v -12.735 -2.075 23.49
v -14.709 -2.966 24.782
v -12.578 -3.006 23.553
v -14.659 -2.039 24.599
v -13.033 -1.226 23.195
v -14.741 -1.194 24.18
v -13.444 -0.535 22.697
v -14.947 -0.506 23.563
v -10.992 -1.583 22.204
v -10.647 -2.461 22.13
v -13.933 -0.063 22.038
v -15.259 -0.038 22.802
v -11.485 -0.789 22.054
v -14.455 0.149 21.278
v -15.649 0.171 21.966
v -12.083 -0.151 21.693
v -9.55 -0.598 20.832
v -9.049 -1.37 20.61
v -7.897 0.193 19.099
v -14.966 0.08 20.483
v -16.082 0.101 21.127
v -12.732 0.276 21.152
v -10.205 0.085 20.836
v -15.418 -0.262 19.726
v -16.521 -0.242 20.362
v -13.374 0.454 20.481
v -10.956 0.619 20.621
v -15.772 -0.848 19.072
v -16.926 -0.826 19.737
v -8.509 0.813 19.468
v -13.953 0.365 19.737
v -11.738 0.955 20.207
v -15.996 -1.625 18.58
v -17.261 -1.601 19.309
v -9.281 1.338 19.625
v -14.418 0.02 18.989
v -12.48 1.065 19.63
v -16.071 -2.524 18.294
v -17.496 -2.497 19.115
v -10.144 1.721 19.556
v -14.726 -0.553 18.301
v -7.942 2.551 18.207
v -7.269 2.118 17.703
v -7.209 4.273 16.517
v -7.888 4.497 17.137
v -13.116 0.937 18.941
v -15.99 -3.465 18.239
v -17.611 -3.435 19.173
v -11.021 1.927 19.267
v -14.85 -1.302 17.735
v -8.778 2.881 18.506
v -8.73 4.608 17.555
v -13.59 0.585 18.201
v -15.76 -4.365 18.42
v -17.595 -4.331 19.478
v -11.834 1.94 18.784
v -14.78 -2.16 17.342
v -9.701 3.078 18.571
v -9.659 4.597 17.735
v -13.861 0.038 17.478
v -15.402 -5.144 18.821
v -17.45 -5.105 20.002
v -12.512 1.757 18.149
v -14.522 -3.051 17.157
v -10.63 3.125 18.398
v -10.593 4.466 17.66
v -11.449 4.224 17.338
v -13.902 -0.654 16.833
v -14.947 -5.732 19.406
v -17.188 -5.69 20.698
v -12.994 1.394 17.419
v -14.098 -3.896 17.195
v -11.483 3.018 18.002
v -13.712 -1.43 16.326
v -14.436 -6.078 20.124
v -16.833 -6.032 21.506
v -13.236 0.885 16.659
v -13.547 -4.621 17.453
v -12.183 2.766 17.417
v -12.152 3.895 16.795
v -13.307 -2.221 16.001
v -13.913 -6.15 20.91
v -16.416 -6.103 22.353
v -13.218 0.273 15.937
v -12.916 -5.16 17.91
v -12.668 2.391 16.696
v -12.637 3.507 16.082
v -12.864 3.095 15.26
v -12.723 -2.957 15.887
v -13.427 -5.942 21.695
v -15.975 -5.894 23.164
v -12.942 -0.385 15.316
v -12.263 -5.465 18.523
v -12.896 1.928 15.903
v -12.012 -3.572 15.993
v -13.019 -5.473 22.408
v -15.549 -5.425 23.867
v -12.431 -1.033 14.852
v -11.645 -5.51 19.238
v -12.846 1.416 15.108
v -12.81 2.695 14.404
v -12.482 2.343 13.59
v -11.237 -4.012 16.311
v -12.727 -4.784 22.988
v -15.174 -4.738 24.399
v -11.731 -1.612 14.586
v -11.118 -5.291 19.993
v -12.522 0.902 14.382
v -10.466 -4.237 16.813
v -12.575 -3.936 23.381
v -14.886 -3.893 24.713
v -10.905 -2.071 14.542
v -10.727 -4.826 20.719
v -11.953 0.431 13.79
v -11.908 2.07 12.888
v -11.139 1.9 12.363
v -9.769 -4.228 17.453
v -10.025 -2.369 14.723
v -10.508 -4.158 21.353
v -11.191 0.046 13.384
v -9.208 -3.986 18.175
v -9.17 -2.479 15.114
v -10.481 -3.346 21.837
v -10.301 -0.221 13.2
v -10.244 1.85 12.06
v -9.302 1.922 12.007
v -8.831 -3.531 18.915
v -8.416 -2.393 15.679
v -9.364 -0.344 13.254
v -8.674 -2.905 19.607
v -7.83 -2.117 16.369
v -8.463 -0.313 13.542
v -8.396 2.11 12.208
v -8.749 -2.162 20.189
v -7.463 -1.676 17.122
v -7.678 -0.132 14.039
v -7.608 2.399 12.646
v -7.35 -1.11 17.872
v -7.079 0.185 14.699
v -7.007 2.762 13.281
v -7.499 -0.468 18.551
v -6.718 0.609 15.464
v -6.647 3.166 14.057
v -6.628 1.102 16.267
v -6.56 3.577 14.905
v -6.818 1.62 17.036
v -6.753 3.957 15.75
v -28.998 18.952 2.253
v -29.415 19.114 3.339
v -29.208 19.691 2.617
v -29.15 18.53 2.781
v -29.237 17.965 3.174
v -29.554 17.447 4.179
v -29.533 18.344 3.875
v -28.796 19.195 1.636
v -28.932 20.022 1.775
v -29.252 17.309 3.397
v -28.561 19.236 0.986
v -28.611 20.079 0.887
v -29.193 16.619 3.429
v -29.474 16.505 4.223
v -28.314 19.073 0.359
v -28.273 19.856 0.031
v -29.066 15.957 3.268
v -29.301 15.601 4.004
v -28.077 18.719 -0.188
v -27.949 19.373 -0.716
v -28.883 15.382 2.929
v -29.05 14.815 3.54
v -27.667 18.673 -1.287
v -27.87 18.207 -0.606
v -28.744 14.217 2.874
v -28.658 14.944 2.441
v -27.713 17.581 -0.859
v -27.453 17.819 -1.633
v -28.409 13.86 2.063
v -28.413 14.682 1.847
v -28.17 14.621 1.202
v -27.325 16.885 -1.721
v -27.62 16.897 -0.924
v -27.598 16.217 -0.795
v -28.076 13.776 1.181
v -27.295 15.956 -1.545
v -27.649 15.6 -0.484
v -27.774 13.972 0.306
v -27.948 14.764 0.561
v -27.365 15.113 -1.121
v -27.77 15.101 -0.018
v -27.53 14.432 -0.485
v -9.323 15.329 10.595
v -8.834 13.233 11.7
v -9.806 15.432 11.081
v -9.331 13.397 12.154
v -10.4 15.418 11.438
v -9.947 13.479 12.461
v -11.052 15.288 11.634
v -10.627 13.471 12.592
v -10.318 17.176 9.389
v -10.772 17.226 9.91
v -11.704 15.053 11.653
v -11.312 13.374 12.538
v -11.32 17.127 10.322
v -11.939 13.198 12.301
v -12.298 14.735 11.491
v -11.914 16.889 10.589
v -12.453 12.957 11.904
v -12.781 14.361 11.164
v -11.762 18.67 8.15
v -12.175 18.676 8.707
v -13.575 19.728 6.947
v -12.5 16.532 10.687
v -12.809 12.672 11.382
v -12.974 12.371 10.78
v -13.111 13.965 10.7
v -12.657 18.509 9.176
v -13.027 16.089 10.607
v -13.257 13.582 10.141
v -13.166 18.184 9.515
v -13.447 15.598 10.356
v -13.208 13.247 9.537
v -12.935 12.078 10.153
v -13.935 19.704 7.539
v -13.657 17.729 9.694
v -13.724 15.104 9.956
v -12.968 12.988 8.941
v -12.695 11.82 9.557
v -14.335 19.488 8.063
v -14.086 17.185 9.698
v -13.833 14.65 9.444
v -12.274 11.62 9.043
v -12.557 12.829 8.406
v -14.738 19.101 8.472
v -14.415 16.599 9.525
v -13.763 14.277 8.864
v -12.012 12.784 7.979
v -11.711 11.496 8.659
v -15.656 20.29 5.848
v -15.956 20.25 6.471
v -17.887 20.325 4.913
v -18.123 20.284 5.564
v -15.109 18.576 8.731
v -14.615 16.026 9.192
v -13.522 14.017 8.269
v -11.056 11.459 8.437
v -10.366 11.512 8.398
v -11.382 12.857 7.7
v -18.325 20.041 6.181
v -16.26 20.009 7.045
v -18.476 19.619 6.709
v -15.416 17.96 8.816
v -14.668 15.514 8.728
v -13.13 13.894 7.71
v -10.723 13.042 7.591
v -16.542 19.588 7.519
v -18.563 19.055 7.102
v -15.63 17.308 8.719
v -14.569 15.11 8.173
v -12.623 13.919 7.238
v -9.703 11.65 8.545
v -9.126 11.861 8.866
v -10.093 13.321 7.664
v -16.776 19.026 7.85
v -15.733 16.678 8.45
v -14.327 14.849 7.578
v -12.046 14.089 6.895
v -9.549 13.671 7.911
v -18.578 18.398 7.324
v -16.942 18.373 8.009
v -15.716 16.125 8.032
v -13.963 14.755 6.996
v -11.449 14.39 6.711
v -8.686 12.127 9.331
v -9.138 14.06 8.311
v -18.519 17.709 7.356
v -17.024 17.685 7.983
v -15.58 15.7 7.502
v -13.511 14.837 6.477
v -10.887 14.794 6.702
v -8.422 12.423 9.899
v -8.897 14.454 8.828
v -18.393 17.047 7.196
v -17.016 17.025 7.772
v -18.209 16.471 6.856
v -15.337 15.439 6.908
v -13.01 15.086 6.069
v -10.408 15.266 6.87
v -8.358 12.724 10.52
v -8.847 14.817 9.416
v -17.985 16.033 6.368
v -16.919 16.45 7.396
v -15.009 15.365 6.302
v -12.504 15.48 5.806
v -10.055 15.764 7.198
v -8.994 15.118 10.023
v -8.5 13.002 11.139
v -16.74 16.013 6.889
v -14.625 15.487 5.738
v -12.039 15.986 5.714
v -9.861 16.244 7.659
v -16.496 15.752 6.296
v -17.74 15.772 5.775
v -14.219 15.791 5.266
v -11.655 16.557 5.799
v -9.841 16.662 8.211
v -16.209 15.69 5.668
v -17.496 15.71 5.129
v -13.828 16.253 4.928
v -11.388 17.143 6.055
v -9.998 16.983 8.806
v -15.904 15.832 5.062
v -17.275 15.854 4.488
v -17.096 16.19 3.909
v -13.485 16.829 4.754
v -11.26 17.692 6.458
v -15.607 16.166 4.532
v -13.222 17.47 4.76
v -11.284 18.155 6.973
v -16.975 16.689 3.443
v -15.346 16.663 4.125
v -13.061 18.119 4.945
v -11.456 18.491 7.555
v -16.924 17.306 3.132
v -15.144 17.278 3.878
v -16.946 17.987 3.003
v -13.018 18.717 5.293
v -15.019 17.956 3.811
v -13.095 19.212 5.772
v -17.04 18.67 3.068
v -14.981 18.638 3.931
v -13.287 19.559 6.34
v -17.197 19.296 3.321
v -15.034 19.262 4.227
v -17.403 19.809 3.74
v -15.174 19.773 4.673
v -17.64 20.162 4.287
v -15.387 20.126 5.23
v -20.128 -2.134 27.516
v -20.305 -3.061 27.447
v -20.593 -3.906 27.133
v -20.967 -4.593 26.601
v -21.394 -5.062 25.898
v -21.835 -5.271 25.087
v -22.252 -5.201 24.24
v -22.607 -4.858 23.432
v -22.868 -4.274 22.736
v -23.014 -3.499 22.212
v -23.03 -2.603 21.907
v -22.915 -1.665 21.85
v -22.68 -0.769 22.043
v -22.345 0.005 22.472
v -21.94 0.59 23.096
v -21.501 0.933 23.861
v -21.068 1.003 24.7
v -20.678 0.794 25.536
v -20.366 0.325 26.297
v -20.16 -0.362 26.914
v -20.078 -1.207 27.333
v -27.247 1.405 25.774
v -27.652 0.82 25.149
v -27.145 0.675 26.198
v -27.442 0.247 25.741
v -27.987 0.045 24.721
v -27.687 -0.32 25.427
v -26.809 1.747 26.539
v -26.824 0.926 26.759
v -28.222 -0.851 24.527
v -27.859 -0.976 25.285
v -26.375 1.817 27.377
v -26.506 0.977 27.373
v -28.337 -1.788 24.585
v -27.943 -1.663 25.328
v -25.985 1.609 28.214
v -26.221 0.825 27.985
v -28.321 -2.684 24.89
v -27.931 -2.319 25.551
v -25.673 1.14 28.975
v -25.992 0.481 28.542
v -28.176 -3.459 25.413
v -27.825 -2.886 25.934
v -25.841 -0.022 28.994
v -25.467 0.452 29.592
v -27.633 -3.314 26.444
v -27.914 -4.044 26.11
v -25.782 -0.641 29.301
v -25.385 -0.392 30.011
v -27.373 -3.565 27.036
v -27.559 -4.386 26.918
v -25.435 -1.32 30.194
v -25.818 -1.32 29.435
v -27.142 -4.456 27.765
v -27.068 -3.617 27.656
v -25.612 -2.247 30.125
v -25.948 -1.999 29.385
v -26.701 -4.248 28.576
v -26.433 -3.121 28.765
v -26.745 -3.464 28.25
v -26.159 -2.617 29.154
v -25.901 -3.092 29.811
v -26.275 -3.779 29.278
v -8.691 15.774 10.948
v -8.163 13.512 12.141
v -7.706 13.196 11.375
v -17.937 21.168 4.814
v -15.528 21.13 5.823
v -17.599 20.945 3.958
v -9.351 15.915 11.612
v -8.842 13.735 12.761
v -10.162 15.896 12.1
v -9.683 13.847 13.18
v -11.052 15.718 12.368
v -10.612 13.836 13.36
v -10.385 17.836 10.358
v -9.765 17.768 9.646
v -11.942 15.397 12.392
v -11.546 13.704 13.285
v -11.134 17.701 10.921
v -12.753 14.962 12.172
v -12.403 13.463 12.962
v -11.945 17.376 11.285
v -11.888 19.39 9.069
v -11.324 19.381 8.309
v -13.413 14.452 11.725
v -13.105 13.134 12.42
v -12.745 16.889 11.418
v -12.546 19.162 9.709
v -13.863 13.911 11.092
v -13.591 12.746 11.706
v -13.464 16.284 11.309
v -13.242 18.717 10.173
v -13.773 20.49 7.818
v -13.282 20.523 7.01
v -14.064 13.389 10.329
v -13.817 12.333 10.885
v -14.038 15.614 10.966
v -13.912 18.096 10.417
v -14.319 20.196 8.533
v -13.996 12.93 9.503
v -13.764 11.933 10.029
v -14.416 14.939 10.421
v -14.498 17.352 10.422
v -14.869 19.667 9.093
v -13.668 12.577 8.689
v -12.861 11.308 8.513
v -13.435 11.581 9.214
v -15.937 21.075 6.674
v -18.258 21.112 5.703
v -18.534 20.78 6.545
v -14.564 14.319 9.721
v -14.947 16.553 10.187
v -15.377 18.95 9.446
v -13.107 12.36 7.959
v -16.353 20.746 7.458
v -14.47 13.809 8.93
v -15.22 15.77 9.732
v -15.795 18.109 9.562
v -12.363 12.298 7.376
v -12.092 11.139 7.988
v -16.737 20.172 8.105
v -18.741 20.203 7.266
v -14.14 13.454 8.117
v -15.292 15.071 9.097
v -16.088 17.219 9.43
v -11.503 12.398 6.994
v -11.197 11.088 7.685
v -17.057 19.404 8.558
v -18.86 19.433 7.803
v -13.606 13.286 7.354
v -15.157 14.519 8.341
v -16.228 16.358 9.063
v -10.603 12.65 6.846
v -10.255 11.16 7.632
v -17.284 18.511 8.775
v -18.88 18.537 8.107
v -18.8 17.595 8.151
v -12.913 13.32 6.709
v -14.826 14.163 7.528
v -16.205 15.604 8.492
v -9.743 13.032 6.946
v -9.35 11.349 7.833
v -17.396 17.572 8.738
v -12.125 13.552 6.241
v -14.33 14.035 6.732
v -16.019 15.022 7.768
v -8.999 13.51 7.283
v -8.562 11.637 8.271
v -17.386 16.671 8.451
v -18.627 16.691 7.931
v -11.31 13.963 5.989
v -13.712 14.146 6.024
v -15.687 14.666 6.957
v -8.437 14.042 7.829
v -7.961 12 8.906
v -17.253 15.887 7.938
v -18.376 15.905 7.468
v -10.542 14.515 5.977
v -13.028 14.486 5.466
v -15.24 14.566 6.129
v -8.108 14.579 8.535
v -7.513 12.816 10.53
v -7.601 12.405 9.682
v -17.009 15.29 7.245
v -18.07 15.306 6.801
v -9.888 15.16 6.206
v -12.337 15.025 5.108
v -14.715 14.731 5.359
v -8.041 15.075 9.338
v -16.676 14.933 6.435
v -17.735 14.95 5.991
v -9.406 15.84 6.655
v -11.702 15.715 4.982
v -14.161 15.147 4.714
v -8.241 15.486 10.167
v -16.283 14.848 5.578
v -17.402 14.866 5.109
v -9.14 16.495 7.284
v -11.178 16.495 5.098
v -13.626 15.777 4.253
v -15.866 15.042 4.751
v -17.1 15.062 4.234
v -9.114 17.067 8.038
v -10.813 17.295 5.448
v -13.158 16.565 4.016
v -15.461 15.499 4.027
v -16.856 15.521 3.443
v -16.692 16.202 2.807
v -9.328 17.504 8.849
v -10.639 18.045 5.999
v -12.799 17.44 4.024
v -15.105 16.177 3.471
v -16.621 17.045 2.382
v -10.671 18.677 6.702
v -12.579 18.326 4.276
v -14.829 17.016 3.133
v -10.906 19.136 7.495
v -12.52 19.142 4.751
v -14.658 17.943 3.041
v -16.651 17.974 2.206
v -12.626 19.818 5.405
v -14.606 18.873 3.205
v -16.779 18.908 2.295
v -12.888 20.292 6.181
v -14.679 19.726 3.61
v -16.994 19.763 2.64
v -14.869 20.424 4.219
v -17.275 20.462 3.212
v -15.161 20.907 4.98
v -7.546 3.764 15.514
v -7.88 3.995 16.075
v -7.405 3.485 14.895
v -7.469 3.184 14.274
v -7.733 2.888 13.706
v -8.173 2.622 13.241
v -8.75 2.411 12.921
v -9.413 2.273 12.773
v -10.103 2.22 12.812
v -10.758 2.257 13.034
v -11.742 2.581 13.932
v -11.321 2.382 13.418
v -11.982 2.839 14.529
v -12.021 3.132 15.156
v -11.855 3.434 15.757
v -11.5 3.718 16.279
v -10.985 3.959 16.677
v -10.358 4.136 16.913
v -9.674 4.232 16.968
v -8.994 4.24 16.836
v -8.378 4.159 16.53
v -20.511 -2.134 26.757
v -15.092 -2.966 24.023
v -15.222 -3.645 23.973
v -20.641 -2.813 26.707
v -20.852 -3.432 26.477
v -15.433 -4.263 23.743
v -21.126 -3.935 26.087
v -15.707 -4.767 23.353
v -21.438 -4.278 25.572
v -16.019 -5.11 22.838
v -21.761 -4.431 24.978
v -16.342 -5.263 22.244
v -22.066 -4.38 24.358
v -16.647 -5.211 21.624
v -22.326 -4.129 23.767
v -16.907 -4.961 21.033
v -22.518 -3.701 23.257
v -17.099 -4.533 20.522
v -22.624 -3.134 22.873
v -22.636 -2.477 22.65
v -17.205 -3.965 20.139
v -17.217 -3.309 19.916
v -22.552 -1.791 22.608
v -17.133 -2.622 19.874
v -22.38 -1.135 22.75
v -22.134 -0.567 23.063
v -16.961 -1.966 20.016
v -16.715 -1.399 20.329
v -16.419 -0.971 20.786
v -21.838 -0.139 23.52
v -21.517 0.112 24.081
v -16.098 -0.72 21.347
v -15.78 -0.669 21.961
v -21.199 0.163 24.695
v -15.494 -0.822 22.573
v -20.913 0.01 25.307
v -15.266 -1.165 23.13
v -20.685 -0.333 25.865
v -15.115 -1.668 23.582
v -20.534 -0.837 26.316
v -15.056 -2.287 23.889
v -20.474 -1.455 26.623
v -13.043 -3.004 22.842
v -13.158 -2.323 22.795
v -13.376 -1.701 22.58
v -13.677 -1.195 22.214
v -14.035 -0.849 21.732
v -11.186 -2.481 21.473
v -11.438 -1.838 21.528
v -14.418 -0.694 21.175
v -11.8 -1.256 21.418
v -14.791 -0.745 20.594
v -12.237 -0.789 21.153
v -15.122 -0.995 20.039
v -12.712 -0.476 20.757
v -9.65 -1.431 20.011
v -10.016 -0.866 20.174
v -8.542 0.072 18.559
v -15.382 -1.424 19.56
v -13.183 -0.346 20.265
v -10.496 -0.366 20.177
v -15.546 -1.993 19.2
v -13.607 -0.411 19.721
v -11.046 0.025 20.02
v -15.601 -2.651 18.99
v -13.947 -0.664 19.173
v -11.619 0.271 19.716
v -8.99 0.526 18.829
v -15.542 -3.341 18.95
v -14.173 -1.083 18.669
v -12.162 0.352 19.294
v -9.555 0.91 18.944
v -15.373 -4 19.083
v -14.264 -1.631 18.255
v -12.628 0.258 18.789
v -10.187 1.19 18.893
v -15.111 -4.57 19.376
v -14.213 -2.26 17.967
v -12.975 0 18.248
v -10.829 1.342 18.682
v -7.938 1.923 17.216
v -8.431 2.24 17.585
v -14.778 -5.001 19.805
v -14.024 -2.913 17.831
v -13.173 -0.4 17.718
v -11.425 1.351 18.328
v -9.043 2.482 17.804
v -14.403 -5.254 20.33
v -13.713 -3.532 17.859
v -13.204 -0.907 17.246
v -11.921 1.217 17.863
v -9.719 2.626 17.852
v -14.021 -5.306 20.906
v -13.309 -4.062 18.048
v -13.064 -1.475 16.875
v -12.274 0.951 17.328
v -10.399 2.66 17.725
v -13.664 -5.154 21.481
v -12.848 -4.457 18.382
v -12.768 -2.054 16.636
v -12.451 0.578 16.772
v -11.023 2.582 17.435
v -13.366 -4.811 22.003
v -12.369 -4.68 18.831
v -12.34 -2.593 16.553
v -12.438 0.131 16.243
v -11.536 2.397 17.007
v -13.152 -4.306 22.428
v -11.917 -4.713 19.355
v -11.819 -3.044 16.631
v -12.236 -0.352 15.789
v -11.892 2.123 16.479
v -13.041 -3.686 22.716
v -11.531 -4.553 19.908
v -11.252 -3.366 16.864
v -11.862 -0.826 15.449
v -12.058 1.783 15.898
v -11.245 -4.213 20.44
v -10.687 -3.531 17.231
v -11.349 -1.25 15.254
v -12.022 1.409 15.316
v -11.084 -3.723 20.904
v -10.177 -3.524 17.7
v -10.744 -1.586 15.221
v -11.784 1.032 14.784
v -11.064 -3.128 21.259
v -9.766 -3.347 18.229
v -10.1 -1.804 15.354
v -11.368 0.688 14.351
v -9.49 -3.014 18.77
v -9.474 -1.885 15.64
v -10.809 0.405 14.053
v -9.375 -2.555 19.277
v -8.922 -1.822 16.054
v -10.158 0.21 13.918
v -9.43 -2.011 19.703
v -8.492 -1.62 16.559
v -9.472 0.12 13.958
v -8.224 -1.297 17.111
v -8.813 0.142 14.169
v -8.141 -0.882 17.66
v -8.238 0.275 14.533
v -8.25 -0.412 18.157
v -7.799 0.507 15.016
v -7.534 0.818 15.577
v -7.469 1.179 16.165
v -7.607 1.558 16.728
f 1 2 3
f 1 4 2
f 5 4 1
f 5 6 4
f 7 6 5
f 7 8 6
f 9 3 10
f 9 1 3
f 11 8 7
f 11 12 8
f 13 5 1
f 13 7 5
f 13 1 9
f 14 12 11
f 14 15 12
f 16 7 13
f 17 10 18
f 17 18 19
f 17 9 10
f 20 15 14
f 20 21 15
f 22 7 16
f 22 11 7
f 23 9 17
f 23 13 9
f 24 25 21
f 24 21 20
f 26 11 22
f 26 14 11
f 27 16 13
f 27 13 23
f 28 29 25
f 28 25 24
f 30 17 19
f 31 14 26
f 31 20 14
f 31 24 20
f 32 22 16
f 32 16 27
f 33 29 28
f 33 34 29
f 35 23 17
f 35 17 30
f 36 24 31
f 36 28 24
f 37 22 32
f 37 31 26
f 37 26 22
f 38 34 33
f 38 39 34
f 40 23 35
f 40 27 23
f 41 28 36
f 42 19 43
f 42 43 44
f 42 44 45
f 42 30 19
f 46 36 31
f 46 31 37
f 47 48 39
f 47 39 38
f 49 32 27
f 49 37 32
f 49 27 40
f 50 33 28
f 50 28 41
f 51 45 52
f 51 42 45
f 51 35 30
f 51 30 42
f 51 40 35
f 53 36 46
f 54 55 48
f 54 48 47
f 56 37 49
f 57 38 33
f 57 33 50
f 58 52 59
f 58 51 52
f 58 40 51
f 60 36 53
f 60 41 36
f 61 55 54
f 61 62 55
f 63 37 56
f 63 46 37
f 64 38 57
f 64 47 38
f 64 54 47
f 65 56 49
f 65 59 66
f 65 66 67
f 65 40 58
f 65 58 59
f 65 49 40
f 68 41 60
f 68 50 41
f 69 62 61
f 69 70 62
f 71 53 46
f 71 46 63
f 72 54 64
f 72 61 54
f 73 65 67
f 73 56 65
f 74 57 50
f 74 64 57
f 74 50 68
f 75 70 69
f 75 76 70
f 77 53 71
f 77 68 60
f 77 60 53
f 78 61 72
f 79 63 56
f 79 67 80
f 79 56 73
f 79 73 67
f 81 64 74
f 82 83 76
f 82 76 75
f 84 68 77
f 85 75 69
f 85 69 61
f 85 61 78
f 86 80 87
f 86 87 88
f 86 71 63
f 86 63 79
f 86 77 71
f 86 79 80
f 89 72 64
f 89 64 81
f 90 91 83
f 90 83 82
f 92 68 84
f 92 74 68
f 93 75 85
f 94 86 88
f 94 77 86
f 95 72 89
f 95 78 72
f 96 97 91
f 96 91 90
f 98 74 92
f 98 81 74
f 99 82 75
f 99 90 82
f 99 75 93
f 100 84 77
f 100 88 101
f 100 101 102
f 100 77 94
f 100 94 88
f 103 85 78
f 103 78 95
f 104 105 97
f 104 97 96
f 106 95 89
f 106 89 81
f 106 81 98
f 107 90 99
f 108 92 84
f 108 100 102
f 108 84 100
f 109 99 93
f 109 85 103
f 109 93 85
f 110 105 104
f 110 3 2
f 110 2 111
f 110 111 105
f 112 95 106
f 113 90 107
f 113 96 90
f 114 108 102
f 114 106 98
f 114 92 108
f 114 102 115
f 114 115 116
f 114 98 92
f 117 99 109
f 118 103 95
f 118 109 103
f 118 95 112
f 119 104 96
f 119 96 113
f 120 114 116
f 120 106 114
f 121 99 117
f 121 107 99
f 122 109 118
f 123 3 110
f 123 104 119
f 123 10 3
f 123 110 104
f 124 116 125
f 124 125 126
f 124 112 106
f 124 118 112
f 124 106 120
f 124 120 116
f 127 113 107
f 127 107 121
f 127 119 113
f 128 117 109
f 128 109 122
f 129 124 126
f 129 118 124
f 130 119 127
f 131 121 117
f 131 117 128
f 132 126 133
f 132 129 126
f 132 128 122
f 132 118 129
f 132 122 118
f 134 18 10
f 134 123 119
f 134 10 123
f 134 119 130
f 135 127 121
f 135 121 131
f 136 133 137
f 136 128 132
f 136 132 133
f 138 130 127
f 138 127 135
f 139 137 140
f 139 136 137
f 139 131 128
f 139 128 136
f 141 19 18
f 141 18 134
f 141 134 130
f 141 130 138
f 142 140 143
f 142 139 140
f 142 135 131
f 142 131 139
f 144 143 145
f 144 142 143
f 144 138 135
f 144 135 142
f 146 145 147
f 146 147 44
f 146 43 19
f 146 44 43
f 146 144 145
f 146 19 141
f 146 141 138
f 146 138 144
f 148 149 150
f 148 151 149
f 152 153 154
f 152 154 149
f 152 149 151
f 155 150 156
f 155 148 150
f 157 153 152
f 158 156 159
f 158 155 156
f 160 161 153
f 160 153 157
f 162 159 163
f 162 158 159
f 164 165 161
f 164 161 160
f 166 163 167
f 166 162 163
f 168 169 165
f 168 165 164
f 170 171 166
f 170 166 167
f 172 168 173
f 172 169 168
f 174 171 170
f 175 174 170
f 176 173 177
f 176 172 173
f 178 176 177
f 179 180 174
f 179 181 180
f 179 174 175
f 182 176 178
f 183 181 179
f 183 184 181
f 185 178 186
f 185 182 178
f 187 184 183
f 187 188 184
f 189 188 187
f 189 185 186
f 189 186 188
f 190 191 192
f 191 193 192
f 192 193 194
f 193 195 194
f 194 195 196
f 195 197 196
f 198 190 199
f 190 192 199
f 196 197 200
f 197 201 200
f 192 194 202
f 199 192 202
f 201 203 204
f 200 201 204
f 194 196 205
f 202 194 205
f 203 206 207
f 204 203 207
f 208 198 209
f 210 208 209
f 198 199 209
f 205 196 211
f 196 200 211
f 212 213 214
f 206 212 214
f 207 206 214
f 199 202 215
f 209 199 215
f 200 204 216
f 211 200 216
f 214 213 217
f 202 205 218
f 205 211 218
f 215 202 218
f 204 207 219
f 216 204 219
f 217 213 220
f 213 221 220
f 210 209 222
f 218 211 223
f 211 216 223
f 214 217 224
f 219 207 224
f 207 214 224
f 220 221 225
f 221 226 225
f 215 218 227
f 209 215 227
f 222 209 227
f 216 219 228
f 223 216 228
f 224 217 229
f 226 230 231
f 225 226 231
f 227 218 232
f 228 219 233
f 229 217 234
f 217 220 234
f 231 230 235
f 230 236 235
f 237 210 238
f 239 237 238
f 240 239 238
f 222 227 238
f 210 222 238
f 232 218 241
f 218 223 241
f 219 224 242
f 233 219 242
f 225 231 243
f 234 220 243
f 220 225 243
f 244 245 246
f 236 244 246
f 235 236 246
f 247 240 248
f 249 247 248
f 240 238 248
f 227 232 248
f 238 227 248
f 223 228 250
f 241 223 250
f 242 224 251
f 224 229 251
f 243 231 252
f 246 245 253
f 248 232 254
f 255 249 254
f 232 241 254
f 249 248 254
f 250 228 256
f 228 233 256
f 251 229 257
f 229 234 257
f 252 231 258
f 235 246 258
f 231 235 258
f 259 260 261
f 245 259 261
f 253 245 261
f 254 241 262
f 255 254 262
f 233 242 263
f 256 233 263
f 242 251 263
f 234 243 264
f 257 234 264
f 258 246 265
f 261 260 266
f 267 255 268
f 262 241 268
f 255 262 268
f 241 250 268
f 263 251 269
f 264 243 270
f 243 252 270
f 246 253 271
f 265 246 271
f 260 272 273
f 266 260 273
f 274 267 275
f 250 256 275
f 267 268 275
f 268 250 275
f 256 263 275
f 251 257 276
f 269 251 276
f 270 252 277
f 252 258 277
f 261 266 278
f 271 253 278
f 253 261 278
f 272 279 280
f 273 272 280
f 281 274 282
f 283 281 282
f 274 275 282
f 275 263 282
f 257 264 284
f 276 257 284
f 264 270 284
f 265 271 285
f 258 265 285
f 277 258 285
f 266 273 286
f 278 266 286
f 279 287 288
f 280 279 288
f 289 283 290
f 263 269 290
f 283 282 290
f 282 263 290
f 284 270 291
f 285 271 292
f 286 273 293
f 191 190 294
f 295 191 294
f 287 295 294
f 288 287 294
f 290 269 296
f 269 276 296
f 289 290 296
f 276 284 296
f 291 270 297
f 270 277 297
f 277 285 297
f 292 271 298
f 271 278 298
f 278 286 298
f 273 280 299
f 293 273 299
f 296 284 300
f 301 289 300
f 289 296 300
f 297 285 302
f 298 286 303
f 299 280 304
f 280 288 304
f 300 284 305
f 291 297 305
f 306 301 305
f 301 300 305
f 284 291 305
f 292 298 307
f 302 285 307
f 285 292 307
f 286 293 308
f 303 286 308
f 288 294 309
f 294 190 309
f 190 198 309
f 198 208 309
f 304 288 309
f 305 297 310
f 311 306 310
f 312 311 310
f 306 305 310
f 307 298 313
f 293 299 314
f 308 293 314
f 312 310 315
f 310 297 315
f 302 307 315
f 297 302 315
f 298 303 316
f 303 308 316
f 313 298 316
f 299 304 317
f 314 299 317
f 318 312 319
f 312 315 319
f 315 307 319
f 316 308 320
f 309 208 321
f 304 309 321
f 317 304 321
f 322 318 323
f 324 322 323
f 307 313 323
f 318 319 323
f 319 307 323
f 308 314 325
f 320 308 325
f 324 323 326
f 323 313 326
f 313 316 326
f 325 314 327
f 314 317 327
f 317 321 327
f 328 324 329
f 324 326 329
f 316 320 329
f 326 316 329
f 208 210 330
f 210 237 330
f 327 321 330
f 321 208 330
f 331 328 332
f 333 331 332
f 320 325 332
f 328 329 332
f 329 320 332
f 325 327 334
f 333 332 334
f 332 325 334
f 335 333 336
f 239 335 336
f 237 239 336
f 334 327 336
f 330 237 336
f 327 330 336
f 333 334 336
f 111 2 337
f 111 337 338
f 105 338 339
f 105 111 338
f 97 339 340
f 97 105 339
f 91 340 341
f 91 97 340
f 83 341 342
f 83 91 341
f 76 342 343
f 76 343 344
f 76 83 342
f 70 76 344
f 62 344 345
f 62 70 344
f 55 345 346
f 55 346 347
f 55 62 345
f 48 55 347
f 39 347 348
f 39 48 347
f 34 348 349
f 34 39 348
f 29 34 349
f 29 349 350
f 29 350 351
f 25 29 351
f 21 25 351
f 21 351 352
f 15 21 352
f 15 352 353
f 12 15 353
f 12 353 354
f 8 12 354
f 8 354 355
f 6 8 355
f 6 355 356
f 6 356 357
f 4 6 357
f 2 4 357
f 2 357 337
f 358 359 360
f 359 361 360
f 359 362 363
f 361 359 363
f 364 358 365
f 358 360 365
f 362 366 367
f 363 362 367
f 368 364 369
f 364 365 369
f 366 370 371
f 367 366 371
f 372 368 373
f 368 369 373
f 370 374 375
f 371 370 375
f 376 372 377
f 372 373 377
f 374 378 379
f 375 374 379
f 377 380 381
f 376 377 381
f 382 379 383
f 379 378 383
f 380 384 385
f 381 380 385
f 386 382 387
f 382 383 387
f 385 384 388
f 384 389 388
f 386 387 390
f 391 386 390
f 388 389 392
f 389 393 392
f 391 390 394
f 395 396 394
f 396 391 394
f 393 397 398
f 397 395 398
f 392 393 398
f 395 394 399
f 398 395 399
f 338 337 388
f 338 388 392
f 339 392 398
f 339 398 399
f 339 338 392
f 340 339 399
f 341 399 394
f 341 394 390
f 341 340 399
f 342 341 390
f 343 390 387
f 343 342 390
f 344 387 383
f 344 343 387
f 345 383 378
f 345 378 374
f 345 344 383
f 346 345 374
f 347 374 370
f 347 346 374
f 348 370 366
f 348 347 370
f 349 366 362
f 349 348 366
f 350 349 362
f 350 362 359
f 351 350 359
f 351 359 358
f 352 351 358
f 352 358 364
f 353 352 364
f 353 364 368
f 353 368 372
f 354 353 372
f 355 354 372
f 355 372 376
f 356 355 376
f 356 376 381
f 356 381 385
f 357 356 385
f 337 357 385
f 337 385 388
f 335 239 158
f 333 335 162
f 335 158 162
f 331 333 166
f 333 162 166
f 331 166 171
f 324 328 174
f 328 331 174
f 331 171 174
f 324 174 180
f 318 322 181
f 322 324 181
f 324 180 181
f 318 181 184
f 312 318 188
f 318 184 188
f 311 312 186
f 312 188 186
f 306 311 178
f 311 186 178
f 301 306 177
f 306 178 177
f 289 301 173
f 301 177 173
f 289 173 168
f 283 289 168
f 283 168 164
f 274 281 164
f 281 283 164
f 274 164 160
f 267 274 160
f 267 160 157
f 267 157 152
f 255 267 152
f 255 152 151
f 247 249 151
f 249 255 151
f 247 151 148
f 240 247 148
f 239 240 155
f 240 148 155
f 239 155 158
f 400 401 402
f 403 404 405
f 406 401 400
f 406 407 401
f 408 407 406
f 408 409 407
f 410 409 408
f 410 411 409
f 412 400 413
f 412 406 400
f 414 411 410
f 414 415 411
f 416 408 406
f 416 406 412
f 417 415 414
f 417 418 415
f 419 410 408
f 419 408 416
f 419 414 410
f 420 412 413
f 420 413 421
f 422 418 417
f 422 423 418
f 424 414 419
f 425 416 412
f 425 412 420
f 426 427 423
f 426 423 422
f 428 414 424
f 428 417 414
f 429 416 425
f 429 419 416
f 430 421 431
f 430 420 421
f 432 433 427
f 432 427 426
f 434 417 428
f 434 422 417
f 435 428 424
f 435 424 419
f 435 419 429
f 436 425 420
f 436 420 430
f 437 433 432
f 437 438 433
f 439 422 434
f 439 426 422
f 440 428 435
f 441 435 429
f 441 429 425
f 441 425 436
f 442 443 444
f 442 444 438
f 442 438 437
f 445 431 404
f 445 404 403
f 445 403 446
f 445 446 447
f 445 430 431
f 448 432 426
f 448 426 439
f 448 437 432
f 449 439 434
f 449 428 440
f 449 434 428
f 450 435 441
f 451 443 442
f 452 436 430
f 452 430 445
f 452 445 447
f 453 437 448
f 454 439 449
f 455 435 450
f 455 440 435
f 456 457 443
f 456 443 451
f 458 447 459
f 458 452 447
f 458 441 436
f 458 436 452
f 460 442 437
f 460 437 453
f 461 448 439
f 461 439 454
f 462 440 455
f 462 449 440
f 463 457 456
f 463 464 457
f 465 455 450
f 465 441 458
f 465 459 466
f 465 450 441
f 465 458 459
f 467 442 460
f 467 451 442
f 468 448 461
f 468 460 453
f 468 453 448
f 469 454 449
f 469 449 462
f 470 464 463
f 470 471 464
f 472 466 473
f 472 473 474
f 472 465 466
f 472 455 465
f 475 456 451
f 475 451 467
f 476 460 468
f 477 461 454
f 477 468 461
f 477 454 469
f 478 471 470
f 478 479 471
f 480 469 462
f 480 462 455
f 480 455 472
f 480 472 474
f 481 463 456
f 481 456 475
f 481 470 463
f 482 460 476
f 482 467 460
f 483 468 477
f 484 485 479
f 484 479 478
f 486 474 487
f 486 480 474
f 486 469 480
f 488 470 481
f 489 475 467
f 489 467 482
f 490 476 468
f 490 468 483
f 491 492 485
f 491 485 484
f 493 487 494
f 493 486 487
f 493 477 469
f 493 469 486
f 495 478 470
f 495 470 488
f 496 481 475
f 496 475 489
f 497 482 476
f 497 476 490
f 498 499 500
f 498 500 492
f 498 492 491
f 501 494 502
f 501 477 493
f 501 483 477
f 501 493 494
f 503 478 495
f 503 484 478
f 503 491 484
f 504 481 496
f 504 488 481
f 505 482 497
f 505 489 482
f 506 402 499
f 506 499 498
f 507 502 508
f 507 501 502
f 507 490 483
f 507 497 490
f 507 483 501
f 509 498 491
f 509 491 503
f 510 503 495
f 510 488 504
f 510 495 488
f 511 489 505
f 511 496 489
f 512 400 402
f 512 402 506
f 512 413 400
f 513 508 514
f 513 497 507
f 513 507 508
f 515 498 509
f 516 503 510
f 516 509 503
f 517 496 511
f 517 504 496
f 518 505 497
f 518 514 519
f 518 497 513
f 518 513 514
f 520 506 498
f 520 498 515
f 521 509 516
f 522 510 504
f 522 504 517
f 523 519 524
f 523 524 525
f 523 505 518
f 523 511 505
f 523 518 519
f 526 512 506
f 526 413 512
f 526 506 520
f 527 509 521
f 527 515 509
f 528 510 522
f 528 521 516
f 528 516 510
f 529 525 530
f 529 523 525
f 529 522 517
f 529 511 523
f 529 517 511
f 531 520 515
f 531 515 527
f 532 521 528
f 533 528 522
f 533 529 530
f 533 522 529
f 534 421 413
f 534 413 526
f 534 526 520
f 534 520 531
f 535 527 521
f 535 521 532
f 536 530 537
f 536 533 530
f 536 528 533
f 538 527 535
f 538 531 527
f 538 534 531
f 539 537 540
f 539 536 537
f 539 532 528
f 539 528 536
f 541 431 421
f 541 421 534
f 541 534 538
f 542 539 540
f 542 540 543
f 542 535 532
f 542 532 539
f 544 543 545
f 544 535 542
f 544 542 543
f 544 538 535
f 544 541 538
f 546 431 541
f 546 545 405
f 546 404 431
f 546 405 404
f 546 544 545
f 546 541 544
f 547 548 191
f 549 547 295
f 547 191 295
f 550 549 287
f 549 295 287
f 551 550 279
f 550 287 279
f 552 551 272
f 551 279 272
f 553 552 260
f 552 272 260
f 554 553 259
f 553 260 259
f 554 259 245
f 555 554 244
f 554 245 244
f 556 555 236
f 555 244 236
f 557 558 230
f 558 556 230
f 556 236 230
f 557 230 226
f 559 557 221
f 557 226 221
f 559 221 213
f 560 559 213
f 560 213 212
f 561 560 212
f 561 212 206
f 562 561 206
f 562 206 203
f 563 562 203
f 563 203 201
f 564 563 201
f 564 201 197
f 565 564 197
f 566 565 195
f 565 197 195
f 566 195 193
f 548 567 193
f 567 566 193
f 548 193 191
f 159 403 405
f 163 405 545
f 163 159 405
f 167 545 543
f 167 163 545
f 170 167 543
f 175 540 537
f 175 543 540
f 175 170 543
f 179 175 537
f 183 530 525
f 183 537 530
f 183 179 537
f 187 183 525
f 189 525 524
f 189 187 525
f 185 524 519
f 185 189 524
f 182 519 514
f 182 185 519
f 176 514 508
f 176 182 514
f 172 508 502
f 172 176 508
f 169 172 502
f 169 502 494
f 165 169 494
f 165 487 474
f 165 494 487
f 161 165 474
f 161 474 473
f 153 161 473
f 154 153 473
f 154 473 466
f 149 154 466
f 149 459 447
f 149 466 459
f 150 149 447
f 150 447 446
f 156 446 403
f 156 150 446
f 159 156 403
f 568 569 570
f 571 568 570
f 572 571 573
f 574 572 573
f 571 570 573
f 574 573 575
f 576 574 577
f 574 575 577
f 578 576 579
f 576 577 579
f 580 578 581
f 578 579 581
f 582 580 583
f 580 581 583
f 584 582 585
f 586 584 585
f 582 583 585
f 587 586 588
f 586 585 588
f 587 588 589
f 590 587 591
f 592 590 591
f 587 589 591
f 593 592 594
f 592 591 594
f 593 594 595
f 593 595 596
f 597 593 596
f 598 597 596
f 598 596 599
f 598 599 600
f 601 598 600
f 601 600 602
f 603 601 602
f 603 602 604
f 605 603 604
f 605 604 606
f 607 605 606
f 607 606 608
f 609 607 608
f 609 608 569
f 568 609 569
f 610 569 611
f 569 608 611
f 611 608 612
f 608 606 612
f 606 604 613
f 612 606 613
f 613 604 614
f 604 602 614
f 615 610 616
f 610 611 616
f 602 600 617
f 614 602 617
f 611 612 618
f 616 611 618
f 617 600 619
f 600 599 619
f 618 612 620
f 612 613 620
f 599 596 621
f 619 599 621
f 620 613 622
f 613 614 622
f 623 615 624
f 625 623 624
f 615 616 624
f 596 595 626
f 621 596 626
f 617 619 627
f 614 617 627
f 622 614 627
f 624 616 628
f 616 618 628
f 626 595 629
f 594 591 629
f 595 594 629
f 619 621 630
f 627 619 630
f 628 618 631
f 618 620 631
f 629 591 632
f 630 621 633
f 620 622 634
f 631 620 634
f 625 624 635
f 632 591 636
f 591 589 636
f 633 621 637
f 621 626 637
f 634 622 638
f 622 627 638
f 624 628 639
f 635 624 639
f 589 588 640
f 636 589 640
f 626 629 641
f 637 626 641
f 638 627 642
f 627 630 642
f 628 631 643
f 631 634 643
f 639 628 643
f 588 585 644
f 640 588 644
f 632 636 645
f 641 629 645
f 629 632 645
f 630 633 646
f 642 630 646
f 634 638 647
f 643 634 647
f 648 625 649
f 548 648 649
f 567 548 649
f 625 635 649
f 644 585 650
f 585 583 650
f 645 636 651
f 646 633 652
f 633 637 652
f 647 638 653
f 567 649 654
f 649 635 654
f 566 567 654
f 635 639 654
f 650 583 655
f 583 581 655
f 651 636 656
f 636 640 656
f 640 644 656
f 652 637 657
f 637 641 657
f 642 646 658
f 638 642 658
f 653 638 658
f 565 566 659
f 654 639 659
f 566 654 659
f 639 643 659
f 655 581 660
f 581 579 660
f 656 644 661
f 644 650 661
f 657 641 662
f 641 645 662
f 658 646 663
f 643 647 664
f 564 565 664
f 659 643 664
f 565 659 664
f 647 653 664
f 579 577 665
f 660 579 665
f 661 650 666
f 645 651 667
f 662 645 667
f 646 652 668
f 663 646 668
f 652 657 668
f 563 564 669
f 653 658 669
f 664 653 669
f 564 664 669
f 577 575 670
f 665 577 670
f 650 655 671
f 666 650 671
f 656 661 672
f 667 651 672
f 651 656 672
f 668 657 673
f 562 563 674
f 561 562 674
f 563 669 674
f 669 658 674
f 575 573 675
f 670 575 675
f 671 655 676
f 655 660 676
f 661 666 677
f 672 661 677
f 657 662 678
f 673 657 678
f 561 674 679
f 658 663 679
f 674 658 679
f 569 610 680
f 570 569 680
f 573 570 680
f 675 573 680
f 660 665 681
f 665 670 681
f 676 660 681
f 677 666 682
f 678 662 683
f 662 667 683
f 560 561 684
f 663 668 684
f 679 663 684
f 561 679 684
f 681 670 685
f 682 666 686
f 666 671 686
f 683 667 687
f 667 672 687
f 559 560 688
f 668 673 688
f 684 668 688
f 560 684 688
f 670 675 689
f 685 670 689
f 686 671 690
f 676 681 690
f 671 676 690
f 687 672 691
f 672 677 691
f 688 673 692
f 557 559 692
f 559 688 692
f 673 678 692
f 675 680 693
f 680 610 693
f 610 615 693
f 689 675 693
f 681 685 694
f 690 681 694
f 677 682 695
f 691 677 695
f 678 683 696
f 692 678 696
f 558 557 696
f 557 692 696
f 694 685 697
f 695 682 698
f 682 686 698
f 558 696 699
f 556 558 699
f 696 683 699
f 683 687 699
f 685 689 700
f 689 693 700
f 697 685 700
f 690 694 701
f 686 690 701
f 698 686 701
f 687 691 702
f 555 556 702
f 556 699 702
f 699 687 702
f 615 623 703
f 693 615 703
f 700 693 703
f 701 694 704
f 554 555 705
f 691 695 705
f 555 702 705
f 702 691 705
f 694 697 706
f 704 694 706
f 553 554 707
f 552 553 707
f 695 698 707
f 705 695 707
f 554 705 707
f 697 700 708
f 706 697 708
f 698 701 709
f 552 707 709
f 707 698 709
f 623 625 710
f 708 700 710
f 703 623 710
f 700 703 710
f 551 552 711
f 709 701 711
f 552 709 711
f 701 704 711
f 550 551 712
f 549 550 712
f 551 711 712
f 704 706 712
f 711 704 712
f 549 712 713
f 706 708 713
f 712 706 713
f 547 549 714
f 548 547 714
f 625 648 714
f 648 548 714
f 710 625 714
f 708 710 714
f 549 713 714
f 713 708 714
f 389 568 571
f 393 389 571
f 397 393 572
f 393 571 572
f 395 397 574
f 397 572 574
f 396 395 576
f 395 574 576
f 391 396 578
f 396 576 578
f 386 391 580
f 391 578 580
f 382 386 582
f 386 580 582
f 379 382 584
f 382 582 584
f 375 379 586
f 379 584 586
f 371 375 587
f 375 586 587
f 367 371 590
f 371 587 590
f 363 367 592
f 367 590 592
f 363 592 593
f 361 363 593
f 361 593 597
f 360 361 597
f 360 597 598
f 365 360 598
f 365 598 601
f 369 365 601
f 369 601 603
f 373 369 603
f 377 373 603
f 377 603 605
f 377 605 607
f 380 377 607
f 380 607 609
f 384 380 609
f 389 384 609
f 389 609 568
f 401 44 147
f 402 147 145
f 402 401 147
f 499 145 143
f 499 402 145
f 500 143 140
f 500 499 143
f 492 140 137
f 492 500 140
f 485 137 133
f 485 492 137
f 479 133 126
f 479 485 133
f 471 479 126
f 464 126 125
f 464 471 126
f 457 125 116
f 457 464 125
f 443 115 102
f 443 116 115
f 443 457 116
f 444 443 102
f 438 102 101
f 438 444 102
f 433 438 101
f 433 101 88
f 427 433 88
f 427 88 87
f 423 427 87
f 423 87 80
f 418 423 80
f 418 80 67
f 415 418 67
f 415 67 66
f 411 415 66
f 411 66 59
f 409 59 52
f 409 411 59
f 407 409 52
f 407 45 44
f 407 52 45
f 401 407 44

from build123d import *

# Parameters (mm, degrees)
SWEEP_SOTTILE1_PROFILE_R   = 3.175
SWEEP_SOTTILE1_PROFILE_R_2 = 2.325


with BuildPart() as part:
    # Sweep-Sottile1: sweep along a curve in space
    with BuildLine() as sweep_sottile1_path:
        Line((-26.865462484, -1.319578805, 27.359243174), (-21.558279201, -2.134095351, 24.681488818))
        Line((-16.139402673, -2.965753945, 21.94737932), (-21.558279201, -2.134095351, 24.681488818))
        ThreePointArc((-16.139402673, -2.965753945, 21.94737932), (-11.292193729, -1.598909493, 18.374309487), (-9.716090498, 3.233926671, 14.868582806))
        Line((-10.669409144, 12.472501866, 10.493247115), (-9.716090498, 3.233926671, 14.868582806))
        ThreePointArc((-17.751858156, 18.020311785, 5.184019113), (-12.960366508, 16.725311229, 7.716153393), (-10.669409144, 12.472501866, 10.493247115))
        Line((-17.751858156, 18.020311785, 5.184019113), (-28.425545748, 16.930941853, 1.25655118))
    # Sweep-Sottile1 profile (on start of the path) → Sweep-Sottile1 (sweep)
    with BuildSketch(Plane(origin=(-26.865462484, -1.319578805, 27.359243174), x_dir=(0.45046243787724455, 0, 0.8927953808469719), z_dir=(0.8845305472584387, -0.13575275761311742, -0.44629239268345283))):
        Circle(SWEEP_SOTTILE1_PROFILE_R)
        Circle(SWEEP_SOTTILE1_PROFILE_R_2, mode=Mode.SUBTRACT)
    sweep(path=sweep_sottile1_path.line)


solid = part.part
